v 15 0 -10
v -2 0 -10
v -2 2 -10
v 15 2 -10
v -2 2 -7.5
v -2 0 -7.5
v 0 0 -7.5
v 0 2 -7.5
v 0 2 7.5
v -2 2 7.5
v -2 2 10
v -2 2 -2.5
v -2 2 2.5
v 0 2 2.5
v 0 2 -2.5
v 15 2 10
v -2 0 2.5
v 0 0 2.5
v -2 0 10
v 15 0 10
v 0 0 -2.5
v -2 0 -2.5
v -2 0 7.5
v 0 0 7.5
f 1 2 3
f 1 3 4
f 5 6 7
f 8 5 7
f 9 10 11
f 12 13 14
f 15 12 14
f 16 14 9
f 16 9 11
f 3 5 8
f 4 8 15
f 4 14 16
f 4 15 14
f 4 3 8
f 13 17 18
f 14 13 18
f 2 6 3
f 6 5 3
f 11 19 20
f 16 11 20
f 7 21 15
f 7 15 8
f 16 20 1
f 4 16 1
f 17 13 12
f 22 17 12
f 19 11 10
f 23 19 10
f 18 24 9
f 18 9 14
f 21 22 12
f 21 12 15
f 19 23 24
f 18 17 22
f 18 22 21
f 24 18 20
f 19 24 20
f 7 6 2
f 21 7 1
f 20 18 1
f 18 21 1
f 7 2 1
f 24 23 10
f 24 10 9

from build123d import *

# Parameters (mm, degrees)
SKETCH1_W           = 30
SKETCH1_H           = 20
SKETCH1_W_2         = 2
SKETCH1_H_2         = 5
BOSS_EXTRUDE1_DEPTH = 2
SKETCH2_R           = 1.5
CUT_EXTRUDE1_DEPTH  = 10
SKETCH3_W           = 13
SKETCH3_H           = 20
CUT_EXTRUDE2_DEPTH  = 10


with BuildPart() as part:
    # Sketch1 → Boss-Extrude1 (new body)
    with BuildSketch(Plane(origin=(0, 0, 0), x_dir=(1, 0, 0), z_dir=(0, 1, 0))):
        Rectangle(SKETCH1_W, SKETCH1_H)
        with Locations((-1, 5)):
            Rectangle(SKETCH1_W_2, SKETCH1_H_2, mode=Mode.SUBTRACT)
        with Locations((-1, -5)):
            Rectangle(SKETCH1_W_2, SKETCH1_H_2, mode=Mode.SUBTRACT)
    extrude(amount=BOSS_EXTRUDE1_DEPTH)

    # Sketch2 → Cut-Extrude1 (cut)
    with BuildSketch(Plane(origin=(0, 2, 0), x_dir=(1, 0, 0), z_dir=(0, 1, 0))):
        with Locations(Location((-10, 5, 0), (0, 0, 270))):
            Circle(SKETCH2_R)
        with Locations(Location((-10, -5, 0), (0, 0, 270))):
            Circle(SKETCH2_R)
    extrude(amount=-CUT_EXTRUDE1_DEPTH, mode=Mode.SUBTRACT)

    # Sketch3 → Cut-Extrude2 (cut)
    with BuildSketch(Plane(origin=(0, 2, 0), x_dir=(1, 0, 0), z_dir=(0, 1, 0))):
        with Locations((-8.5, 0)):
            Rectangle(SKETCH3_W, SKETCH3_H)
    extrude(amount=-CUT_EXTRUDE2_DEPTH, mode=Mode.SUBTRACT)


solid = part.part
